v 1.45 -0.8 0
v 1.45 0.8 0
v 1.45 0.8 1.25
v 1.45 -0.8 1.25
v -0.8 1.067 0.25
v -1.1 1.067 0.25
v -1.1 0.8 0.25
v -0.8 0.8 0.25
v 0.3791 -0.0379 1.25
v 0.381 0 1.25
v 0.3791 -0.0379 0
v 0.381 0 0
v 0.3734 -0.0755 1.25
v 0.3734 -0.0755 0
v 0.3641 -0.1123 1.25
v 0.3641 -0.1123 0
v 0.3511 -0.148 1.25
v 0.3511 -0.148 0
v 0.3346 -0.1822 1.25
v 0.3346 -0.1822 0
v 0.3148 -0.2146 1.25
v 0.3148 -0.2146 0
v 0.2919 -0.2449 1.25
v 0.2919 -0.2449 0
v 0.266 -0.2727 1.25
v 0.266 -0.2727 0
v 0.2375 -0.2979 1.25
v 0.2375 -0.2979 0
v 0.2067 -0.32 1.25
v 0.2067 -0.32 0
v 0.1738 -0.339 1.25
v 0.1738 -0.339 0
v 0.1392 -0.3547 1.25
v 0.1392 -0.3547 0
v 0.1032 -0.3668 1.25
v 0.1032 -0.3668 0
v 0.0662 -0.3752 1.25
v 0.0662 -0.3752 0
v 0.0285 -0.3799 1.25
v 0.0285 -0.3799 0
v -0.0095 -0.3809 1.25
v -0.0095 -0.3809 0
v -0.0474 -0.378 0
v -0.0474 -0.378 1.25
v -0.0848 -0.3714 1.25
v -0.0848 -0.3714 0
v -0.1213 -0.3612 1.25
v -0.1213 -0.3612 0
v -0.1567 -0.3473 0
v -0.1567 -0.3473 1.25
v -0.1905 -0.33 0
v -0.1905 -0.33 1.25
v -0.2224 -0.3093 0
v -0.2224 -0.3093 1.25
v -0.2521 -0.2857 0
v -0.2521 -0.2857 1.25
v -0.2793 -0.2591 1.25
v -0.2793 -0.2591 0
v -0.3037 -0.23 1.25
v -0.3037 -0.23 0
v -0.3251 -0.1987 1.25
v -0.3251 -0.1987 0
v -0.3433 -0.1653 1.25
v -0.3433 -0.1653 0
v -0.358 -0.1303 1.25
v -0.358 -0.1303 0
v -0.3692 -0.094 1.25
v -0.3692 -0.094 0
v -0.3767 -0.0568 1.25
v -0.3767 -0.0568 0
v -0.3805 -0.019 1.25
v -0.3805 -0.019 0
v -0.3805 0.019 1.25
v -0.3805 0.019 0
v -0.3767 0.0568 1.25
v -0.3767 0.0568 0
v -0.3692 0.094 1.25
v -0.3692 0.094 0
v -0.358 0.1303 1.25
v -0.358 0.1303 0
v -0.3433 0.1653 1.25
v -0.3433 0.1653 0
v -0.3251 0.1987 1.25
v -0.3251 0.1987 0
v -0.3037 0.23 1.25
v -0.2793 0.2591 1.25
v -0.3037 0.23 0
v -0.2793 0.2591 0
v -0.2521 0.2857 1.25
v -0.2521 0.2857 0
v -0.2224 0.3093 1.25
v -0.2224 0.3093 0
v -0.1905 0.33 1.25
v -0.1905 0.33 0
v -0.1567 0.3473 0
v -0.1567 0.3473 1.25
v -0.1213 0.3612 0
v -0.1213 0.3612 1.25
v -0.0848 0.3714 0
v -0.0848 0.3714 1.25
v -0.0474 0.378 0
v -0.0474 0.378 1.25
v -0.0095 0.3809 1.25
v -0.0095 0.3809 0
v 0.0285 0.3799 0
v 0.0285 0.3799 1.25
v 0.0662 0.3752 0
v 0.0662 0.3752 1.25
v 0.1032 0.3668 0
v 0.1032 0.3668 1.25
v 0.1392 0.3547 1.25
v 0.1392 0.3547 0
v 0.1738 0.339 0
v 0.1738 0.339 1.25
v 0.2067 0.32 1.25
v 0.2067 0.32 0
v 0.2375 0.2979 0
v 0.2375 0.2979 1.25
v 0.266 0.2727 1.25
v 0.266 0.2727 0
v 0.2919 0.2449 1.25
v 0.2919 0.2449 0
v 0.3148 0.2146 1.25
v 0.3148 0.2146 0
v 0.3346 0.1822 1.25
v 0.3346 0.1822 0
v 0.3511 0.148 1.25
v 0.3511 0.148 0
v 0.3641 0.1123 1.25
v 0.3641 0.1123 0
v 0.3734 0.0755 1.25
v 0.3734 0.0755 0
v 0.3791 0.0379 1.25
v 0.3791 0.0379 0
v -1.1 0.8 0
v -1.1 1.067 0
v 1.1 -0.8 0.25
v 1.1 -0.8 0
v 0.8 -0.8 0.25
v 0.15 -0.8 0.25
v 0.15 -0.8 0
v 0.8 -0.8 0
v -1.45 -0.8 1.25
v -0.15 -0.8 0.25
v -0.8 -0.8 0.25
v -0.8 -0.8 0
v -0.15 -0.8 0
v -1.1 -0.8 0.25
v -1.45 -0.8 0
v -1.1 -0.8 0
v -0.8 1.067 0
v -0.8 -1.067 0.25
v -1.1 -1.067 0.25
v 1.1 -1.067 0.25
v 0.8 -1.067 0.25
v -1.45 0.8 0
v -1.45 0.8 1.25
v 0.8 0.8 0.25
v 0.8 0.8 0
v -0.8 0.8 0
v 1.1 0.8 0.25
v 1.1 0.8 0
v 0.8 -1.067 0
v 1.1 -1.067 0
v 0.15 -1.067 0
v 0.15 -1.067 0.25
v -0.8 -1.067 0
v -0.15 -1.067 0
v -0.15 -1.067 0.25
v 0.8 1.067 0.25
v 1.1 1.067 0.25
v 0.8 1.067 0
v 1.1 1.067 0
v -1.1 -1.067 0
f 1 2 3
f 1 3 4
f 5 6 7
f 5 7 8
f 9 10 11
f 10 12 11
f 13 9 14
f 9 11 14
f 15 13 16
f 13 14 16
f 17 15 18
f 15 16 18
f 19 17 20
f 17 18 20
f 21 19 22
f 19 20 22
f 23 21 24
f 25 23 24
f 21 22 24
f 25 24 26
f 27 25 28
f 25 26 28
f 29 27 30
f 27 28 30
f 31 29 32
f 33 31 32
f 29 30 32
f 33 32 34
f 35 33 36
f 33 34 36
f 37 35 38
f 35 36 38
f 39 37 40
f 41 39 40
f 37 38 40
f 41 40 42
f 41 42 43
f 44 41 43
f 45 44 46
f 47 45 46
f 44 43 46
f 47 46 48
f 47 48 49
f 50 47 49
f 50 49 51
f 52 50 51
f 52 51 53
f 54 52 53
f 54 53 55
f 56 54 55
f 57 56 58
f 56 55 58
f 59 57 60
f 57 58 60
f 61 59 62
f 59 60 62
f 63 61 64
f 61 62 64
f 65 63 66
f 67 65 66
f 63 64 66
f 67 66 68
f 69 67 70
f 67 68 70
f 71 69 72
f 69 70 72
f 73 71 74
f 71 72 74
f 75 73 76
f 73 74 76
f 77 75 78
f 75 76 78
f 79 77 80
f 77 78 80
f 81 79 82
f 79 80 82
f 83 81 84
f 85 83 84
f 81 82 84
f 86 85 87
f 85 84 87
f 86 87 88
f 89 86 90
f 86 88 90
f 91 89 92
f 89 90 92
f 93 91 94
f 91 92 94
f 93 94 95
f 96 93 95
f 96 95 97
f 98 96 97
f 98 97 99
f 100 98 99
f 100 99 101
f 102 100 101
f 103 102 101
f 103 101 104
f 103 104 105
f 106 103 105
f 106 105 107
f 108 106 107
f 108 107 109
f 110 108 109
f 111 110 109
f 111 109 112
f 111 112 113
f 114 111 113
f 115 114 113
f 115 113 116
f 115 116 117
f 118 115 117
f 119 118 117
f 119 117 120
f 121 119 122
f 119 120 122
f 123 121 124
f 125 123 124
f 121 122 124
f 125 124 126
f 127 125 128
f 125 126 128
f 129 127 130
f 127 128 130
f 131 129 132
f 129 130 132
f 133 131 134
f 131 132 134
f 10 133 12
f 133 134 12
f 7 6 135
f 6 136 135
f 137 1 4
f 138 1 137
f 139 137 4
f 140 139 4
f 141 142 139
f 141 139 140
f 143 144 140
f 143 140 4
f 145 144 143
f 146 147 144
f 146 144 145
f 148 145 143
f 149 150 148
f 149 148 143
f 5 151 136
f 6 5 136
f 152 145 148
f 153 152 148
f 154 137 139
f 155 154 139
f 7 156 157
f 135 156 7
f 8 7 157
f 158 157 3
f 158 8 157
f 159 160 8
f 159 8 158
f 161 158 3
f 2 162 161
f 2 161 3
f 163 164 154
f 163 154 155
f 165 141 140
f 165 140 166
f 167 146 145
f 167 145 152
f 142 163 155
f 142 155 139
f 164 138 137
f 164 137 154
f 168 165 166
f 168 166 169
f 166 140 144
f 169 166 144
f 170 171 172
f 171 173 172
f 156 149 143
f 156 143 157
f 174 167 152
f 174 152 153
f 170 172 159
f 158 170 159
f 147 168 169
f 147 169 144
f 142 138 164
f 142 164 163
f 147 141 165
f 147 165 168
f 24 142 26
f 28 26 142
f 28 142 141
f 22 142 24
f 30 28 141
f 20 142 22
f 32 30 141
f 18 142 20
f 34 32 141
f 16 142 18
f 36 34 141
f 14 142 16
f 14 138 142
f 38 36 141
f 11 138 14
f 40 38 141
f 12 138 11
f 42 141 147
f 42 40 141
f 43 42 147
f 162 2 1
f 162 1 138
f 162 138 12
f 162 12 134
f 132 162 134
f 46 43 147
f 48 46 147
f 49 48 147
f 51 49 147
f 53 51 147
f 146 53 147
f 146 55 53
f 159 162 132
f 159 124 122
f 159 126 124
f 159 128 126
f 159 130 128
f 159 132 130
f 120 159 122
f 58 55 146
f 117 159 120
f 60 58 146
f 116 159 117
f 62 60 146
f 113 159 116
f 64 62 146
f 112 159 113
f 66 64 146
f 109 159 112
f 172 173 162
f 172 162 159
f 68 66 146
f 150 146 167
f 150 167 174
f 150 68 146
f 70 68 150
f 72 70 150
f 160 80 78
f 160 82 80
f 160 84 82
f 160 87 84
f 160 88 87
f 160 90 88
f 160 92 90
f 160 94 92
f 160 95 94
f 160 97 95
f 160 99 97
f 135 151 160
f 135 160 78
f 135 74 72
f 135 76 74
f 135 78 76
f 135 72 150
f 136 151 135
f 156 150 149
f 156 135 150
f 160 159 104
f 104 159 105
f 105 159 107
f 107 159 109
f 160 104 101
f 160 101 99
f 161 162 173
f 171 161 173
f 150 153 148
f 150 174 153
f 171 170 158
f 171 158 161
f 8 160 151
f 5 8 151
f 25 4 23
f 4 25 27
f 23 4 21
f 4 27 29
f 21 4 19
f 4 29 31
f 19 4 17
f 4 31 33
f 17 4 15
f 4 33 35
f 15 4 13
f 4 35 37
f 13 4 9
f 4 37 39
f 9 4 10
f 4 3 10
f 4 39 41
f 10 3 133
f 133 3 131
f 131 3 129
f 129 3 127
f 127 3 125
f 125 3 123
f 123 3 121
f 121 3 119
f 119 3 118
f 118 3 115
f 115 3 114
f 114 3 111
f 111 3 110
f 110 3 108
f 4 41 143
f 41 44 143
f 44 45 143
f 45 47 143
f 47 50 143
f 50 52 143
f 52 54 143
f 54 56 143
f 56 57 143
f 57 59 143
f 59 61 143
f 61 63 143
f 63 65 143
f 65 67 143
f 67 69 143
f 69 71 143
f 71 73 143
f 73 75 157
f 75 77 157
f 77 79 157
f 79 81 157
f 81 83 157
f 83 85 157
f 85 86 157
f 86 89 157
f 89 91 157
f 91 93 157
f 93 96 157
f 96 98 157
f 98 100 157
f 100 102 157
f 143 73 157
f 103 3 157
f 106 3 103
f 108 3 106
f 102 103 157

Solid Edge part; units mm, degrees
sketch "Sketch1" plane through (0, 0, 0) normal (0, 0, 1) x (1, 0, 0)
  line L0 (1.45, -0.8) -> (-1.45, -0.8)
  line L1 (-1.45, -0.8) -> (-1.45, 0.8)
  line L2 (-1.45, 0.8) -> (1.45, 0.8)
  line L3 (1.45, 0.8) -> (1.45, -0.8)
extrude "Protrusion1" add sketch "Sketch1" along normal blind 1.25
sketch "Sketch2" plane through (0, 0, 0) normal (0, 0, -1) x (1, 0, 0)
  line L0 (-0.8, 1.067) -> (-1.1, 1.067)
  line L1 (-1.1, 1.067) -> (-1.1, 0.8)
  line L2 (-1.1, 0.8) -> (-0.8, 0.8)
  line L3 (-0.8, 0.8) -> (-0.8, 1.067)
  line L4 (0.15, 1.067) -> (-0.15, 1.067)
  line L5 (-0.15, 1.067) -> (-0.15, 0.8)
  line L6 (-0.15, 0.8) -> (0.15, 0.8)
  line L7 (0.15, 0.8) -> (0.15, 1.067)
  line L8 (1.1, 1.067) -> (0.8, 1.067)
  line L9 (0.8, 1.067) -> (0.8, 0.8)
  line L10 (0.8, 0.8) -> (1.1, 0.8)
  line L11 (1.1, 0.8) -> (1.1, 1.067)
  line L12 (1.1, -1.067) -> (0.8, -1.067)
  line L13 (0.8, -1.067) -> (0.8, -0.8)
  line L14 (0.8, -0.8) -> (1.1, -0.8)
  line L15 (1.1, -0.8) -> (1.1, -1.067)
  line L16 (-0.8, -1.067) -> (-1.1, -1.067)
  line L17 (-1.1, -1.067) -> (-1.1, -0.8)
  line L18 (-1.1, -0.8) -> (-0.8, -0.8)
  line L19 (-0.8, -0.8) -> (-0.8, -1.067)
  dimension "D1" = 0.3
  dimension "D2" = 1.9
  dimension "D3" = 0.95
extrude "ExtrudedProtrusion_2" add sketch "Sketch2" against normal blind 0.25
sketch "Sketch3" plane through (0, 0, 0) normal (0, 0, -1) x (1, 0, 0)
  circle A0 centre (0, 0) radius 0.381
extrude "Cutout1" cut sketch "Sketch3" against normal through all
